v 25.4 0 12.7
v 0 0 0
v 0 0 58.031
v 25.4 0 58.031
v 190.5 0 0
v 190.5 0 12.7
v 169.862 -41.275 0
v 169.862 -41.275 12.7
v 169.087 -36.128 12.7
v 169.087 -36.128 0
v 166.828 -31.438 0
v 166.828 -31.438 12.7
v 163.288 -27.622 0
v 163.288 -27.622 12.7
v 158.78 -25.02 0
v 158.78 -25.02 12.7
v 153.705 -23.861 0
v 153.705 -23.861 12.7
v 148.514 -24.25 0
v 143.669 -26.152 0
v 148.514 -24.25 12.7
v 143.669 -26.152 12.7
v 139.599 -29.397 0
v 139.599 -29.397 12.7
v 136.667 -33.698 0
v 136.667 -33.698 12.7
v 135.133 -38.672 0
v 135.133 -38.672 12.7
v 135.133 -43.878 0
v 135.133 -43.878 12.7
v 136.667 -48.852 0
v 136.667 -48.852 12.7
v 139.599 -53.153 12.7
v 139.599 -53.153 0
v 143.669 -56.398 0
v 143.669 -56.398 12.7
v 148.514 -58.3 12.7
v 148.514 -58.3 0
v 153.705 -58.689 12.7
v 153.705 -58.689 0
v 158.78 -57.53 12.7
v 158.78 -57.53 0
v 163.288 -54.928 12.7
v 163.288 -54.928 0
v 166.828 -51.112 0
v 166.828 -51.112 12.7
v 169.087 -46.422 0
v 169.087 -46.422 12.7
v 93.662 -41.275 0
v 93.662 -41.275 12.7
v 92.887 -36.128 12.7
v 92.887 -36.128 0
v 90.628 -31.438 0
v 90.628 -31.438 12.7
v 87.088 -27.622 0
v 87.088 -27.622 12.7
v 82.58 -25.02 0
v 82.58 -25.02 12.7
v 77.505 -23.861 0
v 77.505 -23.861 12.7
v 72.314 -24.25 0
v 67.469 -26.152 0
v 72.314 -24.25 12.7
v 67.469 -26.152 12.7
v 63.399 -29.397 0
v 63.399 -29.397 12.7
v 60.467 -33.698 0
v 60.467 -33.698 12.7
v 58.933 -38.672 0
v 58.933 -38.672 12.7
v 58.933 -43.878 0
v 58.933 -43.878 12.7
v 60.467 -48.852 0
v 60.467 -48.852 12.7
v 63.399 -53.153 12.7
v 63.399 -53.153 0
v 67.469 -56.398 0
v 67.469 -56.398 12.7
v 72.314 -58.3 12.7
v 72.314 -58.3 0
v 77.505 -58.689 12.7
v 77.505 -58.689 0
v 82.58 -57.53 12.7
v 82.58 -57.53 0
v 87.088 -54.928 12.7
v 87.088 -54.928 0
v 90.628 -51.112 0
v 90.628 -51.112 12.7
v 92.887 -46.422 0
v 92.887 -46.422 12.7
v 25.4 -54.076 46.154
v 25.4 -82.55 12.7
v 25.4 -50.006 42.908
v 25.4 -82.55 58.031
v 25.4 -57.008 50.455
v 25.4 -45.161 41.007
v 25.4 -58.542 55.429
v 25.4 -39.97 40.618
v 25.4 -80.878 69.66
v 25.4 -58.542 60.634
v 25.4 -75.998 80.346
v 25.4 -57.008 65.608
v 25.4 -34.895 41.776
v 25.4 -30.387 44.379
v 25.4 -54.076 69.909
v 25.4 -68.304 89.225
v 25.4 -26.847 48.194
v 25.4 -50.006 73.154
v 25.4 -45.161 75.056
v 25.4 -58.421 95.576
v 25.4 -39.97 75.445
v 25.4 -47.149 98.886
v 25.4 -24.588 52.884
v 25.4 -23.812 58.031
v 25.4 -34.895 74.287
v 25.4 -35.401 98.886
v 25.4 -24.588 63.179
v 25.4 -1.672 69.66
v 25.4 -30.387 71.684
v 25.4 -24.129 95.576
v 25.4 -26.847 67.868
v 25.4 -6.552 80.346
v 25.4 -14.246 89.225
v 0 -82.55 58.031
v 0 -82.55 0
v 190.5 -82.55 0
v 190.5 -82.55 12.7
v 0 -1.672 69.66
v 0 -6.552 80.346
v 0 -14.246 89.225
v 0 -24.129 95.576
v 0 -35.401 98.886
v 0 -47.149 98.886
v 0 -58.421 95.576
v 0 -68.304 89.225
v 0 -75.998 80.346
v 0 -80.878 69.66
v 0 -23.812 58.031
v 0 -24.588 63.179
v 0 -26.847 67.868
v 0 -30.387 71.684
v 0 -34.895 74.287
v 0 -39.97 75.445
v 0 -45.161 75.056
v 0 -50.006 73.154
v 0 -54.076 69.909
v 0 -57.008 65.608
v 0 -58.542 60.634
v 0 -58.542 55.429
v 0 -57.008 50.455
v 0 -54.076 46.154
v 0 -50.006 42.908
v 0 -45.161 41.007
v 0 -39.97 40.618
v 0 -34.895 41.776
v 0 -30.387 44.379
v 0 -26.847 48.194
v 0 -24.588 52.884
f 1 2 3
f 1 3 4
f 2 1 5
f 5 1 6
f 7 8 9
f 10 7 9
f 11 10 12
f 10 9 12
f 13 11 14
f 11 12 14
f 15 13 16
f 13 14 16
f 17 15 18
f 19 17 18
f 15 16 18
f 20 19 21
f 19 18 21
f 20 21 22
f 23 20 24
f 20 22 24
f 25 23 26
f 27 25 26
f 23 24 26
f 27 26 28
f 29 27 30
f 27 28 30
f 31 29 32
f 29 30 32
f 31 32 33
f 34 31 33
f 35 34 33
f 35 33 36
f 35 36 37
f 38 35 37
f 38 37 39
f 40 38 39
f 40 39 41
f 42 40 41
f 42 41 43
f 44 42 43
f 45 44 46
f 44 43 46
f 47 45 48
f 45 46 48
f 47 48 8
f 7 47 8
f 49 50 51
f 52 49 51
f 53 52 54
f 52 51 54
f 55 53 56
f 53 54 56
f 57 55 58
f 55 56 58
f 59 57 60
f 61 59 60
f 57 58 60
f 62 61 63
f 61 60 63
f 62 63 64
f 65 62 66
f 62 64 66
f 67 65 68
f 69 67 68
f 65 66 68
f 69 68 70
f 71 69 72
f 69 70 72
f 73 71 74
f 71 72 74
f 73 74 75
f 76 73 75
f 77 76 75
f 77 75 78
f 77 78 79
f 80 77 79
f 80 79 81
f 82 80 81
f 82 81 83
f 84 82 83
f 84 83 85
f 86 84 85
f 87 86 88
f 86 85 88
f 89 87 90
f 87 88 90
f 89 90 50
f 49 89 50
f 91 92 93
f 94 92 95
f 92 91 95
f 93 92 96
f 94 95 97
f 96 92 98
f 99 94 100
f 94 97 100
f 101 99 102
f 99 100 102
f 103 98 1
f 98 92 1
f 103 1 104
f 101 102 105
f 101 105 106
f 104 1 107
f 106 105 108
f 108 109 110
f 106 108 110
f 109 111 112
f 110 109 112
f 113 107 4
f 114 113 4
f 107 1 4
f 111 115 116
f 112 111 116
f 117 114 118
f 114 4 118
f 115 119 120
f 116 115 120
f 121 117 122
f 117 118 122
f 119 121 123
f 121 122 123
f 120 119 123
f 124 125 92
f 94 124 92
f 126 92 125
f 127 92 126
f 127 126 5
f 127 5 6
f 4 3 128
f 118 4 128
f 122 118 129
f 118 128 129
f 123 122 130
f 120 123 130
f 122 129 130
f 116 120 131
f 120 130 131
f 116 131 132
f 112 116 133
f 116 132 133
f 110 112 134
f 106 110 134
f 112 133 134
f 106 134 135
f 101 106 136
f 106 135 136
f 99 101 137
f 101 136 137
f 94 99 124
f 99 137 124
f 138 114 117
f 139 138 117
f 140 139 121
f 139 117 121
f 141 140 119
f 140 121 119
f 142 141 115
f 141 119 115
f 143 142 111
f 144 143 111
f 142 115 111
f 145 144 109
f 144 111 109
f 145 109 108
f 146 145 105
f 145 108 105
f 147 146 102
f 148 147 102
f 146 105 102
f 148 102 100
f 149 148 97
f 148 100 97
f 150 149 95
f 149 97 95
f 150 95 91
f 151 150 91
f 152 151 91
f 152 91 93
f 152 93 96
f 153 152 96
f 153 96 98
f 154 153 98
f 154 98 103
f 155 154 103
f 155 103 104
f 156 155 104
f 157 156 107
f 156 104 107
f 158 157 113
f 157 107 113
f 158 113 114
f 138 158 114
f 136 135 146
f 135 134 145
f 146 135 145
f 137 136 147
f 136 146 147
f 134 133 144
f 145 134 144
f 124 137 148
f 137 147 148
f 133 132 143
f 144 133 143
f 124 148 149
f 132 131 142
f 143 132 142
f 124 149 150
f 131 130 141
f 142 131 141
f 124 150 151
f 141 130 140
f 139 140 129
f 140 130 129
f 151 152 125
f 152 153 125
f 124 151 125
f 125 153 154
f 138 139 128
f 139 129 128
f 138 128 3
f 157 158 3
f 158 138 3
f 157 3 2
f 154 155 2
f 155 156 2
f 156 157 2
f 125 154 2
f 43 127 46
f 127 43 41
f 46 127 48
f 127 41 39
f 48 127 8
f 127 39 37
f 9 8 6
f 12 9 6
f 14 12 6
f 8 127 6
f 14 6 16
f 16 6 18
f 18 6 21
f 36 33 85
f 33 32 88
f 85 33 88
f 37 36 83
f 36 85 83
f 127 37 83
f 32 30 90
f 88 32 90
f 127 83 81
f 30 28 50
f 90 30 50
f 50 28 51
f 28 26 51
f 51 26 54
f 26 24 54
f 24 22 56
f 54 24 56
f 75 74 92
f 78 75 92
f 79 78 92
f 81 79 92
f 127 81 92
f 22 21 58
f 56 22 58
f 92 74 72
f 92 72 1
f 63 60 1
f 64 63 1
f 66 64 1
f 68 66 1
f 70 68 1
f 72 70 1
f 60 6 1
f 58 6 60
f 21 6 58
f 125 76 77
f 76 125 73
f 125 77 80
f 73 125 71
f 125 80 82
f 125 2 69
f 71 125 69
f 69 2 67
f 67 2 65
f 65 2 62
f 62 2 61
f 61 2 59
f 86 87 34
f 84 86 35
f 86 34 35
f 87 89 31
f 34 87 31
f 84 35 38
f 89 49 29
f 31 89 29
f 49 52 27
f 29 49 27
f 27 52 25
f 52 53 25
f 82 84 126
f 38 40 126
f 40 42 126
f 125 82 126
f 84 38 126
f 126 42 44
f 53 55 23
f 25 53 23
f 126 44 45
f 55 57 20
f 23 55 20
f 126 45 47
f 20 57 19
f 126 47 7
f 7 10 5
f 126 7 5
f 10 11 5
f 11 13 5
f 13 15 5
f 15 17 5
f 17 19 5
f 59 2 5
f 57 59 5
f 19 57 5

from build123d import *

# Parameters (mm, degrees)
F1_DEPTH = 82.55
F2_R     = 17.4625
F3_DEPTH = 12.7
F5_DEPTH = 25.4
F6_R     = 17.4625
F7_DEPTH = 25.4


with BuildPart() as f1:
    # F0 (on Front) → F1 (new body)
    with BuildSketch(Plane.XZ):
        Polygon((0, 116.06285), (0, 0), (190.5, 0), (190.5, 12.7), (25.4, 12.7), (25.4, 116.06285), align=None)
    extrude(amount=F1_DEPTH)

    # F2 (on face) → F3 (cut)
    with BuildSketch(Plane.XY.offset(12.7)):
        with Locations((76.2, -41.275)):
            Circle(F2_R)
        with Locations((152.4, -41.275)):
            Circle(F2_R)
    extrude(amount=-F3_DEPTH, mode=Mode.SUBTRACT)

    # F4 (on face) → F5 (cut)
    with BuildSketch(Plane(origin=(0, 0, 0), x_dir=(0, -1, 0), z_dir=(-1, 0, 0))):
        with BuildLine():
            ThreePointArc((0, 58.031425), (41.275, 99.306425), (82.55, 58.031425))
            Line((82.55, 58.031425), (82.55, 116.06285))
            Line((82.55, 116.06285), (0, 116.06285))
            Line((0, 116.06285), (0, 58.031425))
        make_face()
    extrude(amount=-F5_DEPTH, mode=Mode.SUBTRACT)

    # F6 (on face) → F7 (cut)
    with BuildSketch(Plane.YZ.offset(25.4)):
        with Locations((-41.275, 58.031425)):
            Circle(F6_R)
    extrude(amount=-F7_DEPTH, mode=Mode.SUBTRACT)


solid = f1.part
